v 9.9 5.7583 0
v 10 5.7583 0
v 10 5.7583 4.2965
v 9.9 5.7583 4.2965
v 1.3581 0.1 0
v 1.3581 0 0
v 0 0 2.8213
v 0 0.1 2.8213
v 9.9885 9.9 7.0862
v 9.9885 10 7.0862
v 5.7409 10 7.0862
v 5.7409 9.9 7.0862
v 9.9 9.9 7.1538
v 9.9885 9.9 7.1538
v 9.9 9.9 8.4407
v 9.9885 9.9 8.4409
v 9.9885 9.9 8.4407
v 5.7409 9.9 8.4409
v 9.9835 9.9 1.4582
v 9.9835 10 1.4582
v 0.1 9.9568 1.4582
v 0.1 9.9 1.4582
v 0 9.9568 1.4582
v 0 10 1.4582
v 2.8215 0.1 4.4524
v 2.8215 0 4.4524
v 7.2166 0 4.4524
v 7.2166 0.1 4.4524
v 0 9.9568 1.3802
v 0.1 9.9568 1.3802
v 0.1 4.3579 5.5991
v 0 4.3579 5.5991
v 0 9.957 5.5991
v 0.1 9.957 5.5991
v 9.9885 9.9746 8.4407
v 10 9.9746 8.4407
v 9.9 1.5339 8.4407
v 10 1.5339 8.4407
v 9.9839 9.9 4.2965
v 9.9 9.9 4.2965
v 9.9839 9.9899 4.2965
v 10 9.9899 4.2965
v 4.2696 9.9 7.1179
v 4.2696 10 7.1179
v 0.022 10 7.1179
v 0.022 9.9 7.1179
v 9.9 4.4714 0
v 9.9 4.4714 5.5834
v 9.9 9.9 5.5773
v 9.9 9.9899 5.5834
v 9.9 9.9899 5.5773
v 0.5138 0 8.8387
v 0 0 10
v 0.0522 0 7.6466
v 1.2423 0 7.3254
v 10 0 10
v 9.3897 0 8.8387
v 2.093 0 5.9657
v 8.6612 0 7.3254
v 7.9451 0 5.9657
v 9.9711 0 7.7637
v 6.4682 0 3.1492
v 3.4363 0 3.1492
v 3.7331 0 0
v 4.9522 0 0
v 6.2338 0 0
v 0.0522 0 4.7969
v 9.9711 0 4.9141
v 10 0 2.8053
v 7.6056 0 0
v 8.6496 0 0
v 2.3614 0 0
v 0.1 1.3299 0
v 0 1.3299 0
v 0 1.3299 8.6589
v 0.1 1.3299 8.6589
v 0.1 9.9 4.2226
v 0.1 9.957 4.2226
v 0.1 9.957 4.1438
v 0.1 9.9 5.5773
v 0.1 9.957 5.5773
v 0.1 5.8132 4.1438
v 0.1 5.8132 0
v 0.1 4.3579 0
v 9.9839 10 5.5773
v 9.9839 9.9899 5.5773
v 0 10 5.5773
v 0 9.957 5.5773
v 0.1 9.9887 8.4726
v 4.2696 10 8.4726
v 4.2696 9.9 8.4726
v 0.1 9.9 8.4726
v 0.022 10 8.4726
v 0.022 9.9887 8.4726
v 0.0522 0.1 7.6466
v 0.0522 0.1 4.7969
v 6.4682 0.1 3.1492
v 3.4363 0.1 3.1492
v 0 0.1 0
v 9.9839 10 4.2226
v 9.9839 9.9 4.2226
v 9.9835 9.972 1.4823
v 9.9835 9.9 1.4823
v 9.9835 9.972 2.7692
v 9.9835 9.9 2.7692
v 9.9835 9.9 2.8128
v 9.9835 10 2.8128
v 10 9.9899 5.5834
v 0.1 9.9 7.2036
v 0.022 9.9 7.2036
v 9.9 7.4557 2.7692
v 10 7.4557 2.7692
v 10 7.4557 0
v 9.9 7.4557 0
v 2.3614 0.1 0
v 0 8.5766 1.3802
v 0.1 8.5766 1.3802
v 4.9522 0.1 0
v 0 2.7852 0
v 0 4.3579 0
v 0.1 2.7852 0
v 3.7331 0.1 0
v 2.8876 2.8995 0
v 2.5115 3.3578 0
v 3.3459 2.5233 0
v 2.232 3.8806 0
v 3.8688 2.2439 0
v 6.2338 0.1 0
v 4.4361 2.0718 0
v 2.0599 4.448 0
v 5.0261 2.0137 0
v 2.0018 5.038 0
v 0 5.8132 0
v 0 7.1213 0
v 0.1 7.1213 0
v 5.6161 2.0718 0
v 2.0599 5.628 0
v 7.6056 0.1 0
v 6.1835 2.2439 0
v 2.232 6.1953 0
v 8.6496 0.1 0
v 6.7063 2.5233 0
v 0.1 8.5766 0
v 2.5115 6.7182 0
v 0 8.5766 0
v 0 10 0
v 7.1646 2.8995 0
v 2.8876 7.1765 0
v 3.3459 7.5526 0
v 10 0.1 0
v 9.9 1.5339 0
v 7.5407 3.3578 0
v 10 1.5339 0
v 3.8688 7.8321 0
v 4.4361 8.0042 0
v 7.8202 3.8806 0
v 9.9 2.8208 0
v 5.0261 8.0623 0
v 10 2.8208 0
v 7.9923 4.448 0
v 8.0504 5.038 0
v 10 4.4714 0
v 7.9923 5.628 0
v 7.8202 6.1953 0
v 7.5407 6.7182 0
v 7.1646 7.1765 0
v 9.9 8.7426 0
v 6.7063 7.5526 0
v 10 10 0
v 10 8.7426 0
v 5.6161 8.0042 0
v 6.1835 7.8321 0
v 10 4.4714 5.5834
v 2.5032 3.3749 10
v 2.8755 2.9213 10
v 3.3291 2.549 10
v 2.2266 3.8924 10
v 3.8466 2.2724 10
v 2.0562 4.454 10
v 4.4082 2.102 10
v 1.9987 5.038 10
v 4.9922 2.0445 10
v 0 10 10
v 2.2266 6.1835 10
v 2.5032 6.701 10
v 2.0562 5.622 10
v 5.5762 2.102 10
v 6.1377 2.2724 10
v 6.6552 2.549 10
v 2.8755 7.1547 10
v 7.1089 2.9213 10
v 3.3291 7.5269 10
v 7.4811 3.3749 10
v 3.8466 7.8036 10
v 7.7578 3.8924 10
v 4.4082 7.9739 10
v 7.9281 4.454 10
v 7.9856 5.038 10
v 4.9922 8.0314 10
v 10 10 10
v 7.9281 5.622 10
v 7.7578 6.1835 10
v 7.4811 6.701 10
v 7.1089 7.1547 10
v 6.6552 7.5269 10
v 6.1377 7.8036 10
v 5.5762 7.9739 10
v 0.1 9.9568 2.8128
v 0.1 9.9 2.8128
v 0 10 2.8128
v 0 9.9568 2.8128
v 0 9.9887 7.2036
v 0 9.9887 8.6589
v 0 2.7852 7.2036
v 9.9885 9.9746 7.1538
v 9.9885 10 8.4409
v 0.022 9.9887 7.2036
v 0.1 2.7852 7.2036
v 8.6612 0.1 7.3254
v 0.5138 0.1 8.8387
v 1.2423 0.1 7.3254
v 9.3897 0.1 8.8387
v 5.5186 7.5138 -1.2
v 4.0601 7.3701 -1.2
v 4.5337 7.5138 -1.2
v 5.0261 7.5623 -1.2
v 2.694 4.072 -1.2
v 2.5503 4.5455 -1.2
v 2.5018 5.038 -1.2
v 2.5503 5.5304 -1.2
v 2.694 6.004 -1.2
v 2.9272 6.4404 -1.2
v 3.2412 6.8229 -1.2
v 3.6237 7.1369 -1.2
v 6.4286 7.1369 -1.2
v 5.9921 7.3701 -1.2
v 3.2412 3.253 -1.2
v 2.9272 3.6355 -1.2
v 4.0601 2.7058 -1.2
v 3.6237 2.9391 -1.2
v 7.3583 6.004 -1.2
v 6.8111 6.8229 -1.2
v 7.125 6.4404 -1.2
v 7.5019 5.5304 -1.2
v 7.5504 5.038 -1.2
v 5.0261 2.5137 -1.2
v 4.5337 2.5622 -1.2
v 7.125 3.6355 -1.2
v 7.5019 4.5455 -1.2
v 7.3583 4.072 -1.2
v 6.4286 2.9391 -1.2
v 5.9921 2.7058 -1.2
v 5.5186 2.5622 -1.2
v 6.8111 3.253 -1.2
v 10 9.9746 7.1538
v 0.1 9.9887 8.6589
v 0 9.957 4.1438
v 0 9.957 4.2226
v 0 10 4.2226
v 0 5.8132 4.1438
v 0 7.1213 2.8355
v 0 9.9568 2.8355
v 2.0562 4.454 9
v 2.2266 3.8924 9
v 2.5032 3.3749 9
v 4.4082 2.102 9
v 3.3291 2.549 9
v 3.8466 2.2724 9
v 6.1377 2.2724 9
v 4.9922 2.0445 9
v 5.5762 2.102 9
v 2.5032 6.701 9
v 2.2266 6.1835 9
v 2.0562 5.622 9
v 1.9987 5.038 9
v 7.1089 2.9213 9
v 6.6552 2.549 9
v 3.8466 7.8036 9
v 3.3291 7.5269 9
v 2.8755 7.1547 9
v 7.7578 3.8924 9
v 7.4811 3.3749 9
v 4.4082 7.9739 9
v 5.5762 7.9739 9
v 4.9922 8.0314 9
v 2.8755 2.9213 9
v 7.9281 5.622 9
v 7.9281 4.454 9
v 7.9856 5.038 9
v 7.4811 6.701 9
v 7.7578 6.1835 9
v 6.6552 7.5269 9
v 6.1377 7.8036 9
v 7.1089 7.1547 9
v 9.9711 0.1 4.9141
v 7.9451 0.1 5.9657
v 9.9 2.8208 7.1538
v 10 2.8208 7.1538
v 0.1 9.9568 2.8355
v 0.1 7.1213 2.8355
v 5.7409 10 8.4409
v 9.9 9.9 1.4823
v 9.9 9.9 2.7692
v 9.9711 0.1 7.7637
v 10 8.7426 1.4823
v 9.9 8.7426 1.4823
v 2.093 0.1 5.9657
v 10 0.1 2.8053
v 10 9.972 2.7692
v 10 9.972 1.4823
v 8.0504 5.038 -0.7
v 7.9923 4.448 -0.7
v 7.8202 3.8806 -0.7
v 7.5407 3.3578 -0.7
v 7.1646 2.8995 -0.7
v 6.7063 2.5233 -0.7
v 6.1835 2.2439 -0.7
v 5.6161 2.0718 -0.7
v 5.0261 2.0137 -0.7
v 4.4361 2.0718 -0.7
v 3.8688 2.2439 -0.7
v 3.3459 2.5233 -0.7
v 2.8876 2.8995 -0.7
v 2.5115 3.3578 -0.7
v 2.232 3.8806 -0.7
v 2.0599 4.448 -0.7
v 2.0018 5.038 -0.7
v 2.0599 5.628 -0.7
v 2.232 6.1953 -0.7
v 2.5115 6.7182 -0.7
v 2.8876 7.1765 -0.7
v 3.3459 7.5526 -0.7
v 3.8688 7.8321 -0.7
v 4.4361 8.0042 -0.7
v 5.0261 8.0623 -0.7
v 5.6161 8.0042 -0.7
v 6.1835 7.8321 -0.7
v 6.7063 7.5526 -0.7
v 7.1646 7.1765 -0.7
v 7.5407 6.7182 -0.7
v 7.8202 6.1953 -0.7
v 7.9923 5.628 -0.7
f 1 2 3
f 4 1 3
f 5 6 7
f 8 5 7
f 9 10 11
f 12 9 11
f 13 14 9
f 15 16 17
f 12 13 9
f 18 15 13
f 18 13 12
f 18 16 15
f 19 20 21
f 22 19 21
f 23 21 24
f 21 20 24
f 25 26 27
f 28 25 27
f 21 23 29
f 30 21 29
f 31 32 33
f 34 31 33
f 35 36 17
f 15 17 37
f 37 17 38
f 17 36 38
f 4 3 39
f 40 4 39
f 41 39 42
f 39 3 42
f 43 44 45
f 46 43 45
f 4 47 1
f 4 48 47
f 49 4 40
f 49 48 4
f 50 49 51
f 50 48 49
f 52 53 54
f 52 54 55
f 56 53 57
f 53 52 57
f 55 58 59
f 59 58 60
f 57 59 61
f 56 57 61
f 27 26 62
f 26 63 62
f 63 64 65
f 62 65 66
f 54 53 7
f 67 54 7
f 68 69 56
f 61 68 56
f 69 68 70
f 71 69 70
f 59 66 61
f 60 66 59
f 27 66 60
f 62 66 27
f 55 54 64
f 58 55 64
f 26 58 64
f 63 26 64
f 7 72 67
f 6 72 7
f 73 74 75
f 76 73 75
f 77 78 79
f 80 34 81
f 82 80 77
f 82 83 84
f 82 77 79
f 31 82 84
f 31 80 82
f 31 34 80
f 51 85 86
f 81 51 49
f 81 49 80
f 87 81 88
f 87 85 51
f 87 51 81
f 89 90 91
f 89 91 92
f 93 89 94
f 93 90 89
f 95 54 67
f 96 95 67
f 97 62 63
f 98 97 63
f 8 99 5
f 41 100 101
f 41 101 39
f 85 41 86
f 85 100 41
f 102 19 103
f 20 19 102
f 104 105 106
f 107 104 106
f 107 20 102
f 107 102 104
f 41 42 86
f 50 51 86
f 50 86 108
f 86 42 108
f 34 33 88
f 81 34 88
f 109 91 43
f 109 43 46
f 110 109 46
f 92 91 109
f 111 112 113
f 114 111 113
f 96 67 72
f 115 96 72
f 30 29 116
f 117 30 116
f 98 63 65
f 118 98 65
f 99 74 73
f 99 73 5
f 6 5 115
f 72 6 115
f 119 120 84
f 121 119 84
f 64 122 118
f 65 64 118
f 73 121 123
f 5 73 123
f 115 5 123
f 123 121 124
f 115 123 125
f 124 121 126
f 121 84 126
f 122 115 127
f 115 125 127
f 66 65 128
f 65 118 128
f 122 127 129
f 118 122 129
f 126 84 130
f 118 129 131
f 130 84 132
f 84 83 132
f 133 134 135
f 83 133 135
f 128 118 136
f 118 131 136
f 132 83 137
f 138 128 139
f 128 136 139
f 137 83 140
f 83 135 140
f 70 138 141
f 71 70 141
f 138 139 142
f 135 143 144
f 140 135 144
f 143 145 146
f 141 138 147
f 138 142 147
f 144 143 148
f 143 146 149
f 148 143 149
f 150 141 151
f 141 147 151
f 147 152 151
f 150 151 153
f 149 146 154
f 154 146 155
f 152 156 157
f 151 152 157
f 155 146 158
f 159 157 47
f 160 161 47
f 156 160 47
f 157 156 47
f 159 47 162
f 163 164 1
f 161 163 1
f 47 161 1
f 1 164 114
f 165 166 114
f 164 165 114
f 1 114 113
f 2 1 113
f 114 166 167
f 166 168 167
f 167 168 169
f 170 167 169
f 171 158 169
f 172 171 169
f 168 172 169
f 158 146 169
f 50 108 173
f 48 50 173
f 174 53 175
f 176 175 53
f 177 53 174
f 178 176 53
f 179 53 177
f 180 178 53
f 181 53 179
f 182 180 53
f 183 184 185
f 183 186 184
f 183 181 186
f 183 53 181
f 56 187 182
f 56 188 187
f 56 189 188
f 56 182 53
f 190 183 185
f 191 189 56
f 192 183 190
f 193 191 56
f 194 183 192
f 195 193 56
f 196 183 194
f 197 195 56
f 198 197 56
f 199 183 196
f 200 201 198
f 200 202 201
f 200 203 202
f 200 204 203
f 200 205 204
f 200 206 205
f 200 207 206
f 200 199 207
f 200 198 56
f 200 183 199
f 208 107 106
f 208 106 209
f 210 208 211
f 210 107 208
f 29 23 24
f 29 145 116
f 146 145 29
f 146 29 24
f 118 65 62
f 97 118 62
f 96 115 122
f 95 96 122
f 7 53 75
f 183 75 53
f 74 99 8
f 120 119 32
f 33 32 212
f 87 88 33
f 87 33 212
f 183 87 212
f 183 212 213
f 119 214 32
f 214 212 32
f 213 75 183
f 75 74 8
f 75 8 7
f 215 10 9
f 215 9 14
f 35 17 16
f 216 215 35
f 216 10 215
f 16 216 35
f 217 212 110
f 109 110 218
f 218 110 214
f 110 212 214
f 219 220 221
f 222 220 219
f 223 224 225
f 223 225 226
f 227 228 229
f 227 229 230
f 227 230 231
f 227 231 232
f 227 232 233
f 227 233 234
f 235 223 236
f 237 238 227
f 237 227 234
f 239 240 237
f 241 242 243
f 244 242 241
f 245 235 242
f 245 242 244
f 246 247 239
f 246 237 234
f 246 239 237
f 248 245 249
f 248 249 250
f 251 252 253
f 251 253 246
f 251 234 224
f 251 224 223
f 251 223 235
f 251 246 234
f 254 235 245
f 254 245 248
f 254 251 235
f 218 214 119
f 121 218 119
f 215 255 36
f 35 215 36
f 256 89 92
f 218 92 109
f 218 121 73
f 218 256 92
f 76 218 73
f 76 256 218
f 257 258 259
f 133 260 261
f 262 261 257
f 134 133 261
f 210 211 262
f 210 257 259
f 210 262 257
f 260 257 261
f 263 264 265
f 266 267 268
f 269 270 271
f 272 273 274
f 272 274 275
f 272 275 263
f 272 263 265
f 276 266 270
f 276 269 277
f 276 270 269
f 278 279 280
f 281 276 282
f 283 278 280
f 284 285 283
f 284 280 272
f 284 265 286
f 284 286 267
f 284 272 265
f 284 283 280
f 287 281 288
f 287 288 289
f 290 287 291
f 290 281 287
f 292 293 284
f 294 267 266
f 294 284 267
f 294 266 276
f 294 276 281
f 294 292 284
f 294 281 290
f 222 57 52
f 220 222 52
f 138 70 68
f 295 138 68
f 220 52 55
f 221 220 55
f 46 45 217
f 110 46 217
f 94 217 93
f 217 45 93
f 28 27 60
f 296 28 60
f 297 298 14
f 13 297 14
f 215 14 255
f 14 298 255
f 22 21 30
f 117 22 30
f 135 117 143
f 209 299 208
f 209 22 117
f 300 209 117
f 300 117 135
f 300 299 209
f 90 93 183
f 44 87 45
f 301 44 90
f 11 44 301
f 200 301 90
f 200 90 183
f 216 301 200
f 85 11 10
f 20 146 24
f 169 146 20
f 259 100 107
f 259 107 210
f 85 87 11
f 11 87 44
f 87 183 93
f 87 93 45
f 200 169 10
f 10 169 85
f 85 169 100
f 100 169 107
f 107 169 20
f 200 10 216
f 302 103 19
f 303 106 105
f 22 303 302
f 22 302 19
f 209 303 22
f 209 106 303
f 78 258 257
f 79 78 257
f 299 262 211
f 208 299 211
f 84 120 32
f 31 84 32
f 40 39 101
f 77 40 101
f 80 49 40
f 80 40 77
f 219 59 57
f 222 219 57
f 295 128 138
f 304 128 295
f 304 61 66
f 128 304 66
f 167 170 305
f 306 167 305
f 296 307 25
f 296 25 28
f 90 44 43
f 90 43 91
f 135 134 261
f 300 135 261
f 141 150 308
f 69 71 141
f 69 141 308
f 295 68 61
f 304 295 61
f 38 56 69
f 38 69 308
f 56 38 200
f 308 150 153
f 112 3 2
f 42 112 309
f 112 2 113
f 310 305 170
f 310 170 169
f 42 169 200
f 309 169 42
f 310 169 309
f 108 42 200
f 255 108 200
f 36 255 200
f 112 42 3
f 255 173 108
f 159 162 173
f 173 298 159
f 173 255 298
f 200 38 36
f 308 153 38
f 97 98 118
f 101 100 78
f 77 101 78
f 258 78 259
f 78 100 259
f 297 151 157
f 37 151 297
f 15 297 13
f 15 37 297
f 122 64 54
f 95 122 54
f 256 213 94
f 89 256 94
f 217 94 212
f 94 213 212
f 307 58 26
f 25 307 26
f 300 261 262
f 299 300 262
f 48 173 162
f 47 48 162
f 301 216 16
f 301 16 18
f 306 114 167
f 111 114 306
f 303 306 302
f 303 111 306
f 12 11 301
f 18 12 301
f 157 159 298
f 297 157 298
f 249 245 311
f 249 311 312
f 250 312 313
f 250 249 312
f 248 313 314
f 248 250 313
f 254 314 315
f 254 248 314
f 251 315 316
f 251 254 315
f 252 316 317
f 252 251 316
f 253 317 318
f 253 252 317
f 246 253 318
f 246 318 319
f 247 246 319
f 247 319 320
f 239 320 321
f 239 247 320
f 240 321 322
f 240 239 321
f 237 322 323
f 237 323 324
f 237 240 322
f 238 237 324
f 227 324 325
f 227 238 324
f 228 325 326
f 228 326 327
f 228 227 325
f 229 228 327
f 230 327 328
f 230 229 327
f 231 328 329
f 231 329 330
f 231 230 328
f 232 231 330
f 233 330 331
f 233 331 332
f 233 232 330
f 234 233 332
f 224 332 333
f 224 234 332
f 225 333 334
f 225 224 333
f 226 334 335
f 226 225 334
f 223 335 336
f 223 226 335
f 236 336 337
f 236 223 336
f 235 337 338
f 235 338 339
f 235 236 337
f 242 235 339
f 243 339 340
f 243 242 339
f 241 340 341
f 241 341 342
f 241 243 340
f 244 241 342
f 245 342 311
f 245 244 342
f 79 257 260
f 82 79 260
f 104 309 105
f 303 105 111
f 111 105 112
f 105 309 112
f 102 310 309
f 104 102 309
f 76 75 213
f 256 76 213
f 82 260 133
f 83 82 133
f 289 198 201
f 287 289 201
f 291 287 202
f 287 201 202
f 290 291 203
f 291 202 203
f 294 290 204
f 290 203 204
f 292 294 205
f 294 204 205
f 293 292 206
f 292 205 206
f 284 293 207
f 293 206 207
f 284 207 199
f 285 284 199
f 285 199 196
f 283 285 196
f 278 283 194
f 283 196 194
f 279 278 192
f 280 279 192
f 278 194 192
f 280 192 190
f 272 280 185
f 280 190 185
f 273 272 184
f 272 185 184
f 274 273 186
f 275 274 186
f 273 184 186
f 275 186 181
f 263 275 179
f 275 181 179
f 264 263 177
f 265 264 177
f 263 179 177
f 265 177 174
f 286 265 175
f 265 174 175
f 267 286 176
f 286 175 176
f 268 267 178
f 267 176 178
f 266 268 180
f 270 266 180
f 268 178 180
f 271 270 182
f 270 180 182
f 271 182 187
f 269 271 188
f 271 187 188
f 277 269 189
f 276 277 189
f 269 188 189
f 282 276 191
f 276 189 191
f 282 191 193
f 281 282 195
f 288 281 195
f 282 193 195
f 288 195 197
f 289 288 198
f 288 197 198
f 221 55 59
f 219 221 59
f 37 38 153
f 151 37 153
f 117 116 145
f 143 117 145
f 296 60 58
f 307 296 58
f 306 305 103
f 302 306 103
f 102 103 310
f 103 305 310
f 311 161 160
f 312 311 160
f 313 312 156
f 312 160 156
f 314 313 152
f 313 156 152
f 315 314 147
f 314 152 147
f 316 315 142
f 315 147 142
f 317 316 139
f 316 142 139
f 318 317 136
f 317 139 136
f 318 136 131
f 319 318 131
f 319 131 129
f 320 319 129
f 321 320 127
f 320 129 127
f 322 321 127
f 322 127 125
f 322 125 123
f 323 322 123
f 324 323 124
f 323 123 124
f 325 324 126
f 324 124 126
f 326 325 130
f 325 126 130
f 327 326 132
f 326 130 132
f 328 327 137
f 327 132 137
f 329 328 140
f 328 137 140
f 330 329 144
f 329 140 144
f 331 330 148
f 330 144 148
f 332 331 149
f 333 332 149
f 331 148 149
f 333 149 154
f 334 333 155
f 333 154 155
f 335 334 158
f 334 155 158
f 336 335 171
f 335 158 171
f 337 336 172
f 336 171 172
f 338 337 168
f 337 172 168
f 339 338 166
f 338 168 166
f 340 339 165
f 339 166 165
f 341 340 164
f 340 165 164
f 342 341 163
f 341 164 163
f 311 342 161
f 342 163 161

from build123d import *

# Parameters (mm, degrees)
BOX_W           = 10
BOX_H           = 10
BOX_DEPTH       = 10
POCKET_DEPTH    = 0.1
POCKET001_DEPTH = 0.1
POCKET002_DEPTH = 0.1
SKETCH003_W     = 9.983458
SKETCH003_H     = 1.354645
SKETCH003_W_2   = 9.983948
SKETCH003_W_3   = 4.247611
POCKET003_DEPTH = 0.1
SKETCH005_R     = 2.993458
POCKET004_DEPTH = 1
SKETCH004_R     = 3.024316
PAD_DEPTH       = 1.2
CHAMFER_SIZE    = 0.5


with BuildPart() as part:
    # Box → Box (new body)
    with BuildSketch(Plane.XY):
        with Locations((5, 5)):
            Rectangle(BOX_W, BOX_H)
    extrude(amount=BOX_DEPTH)

    # Sketch → Pocket (cut)
    with BuildSketch(Plane.XZ):
        Polygon((-0.013318, 2.848971), (-0.013318, -0.000633), (1.358424, -0.000633), align=None)
        Polygon((10.018128, 2.842927), (10.018128, -0.006678), (8.646385, -0.006678), align=None)
        Polygon((0.052197, 7.646552), (0.052197, 4.796948), (2.377994, -0.034572), (3.749737, -0.034572), align=None)
        Polygon((6.233827, 0), (7.605569, 0), (9.971137, 4.914136), (9.971137, 7.76374), align=None)
        Polygon((3.436299, 3.149153), (4.952238, 0), (6.468178, 3.149153), align=None)
        Polygon((2.093005, 5.965705), (2.8215, 4.452359), (7.216569, 4.452359), (7.945064, 5.965705), align=None)
        Polygon((0.513832, 8.838719), (1.242326, 7.325373), (8.661189, 7.325373), (9.389684, 8.838719), align=None)
    extrude(amount=-POCKET_DEPTH, mode=Mode.SUBTRACT)

    # Sketch001 → Pocket001 (cut)
    with BuildSketch(Plane(origin=(0, 0, 0), x_dir=(0, -1, 0), z_dir=(-1, 0, 0))):
        Polygon((-8.576619, 0), (-7.121317, 0), (-7.121317, 2.835466), (-9.956783, 2.835466), (-9.956783, 1.380163), (-8.576619, 1.380163), align=None)
        Polygon((-9.957004, 5.599077), (-9.957004, 4.143775), (-5.813229, 4.143775), (-5.813229, 0), (-4.357927, 0), (-4.357927, 5.599077), align=None)
        Polygon((-9.988727, 8.658869), (-9.988727, 7.203567), (-2.78516, 7.203567), (-2.78516, 0), (-1.329858, 0), (-1.329858, 8.658869), align=None)
    extrude(amount=-POCKET001_DEPTH, mode=Mode.SUBTRACT)

    # Sketch002 → Pocket002 (cut)
    with BuildSketch(Plane.YZ.offset(10)):
        Polygon((8.742587, 0), (8.742587, 1.482263), (9.971997, 1.482263), (9.971997, 2.769174), (7.455676, 2.769174), (7.455676, 0), align=None)
        Polygon((5.758296, 0), (5.758296, 4.296487), (9.989896, 4.296487), (9.989896, 5.583398), (4.471385, 5.583398), (4.471385, 0), align=None)
        Polygon((2.82081, 0), (2.82081, 7.153826), (9.974636, 7.153826), (9.974636, 8.440737), (1.533899, 8.440737), (1.533899, 0), align=None)
    extrude(amount=-POCKET002_DEPTH, mode=Mode.SUBTRACT)

    # Sketch003 → Pocket003 (cut)
    with BuildSketch(Plane(origin=(0, 10, 0), x_dir=(-1, 0, 0), z_dir=(0, 1, 0))):
        with Locations((-4.991729, 2.135502)):
            Rectangle(SKETCH003_W, SKETCH003_H)
        with Locations((-4.991974, 4.899971)):
            Rectangle(SKETCH003_W_2, SKETCH003_H)
        with Locations((-7.864695, 7.76353)):
            Rectangle(SKETCH003_W_3, SKETCH003_H)
        with Locations((-2.145795, 7.795235)):
            Rectangle(SKETCH003_W_3, SKETCH003_H)
    extrude(amount=-POCKET003_DEPTH, mode=Mode.SUBTRACT)

    # Sketch005 → Pocket004 (cut)
    with BuildSketch(Plane.XY.offset(10)):
        with Locations((4.99216, 5.03797)):
            Circle(SKETCH005_R)
    extrude(amount=-POCKET004_DEPTH, mode=Mode.SUBTRACT)

    # Sketch004 → Pad (new body)
    with BuildSketch(Plane(origin=(0, 0, 0), x_dir=(1, 0, 0), z_dir=(0, 0, -1))):
        with Locations((5.026122, -5.03797)):
            Circle(SKETCH004_R)
    extrude(amount=PAD_DEPTH)

    # Chamfer
    chamfer_edges = [part.edges().sort_by_distance(p)[0] for p in [
        (2.001806, 5.03797, -1.2),
    ]]
    chamfer(chamfer_edges, length=CHAMFER_SIZE)


solid = part.part
